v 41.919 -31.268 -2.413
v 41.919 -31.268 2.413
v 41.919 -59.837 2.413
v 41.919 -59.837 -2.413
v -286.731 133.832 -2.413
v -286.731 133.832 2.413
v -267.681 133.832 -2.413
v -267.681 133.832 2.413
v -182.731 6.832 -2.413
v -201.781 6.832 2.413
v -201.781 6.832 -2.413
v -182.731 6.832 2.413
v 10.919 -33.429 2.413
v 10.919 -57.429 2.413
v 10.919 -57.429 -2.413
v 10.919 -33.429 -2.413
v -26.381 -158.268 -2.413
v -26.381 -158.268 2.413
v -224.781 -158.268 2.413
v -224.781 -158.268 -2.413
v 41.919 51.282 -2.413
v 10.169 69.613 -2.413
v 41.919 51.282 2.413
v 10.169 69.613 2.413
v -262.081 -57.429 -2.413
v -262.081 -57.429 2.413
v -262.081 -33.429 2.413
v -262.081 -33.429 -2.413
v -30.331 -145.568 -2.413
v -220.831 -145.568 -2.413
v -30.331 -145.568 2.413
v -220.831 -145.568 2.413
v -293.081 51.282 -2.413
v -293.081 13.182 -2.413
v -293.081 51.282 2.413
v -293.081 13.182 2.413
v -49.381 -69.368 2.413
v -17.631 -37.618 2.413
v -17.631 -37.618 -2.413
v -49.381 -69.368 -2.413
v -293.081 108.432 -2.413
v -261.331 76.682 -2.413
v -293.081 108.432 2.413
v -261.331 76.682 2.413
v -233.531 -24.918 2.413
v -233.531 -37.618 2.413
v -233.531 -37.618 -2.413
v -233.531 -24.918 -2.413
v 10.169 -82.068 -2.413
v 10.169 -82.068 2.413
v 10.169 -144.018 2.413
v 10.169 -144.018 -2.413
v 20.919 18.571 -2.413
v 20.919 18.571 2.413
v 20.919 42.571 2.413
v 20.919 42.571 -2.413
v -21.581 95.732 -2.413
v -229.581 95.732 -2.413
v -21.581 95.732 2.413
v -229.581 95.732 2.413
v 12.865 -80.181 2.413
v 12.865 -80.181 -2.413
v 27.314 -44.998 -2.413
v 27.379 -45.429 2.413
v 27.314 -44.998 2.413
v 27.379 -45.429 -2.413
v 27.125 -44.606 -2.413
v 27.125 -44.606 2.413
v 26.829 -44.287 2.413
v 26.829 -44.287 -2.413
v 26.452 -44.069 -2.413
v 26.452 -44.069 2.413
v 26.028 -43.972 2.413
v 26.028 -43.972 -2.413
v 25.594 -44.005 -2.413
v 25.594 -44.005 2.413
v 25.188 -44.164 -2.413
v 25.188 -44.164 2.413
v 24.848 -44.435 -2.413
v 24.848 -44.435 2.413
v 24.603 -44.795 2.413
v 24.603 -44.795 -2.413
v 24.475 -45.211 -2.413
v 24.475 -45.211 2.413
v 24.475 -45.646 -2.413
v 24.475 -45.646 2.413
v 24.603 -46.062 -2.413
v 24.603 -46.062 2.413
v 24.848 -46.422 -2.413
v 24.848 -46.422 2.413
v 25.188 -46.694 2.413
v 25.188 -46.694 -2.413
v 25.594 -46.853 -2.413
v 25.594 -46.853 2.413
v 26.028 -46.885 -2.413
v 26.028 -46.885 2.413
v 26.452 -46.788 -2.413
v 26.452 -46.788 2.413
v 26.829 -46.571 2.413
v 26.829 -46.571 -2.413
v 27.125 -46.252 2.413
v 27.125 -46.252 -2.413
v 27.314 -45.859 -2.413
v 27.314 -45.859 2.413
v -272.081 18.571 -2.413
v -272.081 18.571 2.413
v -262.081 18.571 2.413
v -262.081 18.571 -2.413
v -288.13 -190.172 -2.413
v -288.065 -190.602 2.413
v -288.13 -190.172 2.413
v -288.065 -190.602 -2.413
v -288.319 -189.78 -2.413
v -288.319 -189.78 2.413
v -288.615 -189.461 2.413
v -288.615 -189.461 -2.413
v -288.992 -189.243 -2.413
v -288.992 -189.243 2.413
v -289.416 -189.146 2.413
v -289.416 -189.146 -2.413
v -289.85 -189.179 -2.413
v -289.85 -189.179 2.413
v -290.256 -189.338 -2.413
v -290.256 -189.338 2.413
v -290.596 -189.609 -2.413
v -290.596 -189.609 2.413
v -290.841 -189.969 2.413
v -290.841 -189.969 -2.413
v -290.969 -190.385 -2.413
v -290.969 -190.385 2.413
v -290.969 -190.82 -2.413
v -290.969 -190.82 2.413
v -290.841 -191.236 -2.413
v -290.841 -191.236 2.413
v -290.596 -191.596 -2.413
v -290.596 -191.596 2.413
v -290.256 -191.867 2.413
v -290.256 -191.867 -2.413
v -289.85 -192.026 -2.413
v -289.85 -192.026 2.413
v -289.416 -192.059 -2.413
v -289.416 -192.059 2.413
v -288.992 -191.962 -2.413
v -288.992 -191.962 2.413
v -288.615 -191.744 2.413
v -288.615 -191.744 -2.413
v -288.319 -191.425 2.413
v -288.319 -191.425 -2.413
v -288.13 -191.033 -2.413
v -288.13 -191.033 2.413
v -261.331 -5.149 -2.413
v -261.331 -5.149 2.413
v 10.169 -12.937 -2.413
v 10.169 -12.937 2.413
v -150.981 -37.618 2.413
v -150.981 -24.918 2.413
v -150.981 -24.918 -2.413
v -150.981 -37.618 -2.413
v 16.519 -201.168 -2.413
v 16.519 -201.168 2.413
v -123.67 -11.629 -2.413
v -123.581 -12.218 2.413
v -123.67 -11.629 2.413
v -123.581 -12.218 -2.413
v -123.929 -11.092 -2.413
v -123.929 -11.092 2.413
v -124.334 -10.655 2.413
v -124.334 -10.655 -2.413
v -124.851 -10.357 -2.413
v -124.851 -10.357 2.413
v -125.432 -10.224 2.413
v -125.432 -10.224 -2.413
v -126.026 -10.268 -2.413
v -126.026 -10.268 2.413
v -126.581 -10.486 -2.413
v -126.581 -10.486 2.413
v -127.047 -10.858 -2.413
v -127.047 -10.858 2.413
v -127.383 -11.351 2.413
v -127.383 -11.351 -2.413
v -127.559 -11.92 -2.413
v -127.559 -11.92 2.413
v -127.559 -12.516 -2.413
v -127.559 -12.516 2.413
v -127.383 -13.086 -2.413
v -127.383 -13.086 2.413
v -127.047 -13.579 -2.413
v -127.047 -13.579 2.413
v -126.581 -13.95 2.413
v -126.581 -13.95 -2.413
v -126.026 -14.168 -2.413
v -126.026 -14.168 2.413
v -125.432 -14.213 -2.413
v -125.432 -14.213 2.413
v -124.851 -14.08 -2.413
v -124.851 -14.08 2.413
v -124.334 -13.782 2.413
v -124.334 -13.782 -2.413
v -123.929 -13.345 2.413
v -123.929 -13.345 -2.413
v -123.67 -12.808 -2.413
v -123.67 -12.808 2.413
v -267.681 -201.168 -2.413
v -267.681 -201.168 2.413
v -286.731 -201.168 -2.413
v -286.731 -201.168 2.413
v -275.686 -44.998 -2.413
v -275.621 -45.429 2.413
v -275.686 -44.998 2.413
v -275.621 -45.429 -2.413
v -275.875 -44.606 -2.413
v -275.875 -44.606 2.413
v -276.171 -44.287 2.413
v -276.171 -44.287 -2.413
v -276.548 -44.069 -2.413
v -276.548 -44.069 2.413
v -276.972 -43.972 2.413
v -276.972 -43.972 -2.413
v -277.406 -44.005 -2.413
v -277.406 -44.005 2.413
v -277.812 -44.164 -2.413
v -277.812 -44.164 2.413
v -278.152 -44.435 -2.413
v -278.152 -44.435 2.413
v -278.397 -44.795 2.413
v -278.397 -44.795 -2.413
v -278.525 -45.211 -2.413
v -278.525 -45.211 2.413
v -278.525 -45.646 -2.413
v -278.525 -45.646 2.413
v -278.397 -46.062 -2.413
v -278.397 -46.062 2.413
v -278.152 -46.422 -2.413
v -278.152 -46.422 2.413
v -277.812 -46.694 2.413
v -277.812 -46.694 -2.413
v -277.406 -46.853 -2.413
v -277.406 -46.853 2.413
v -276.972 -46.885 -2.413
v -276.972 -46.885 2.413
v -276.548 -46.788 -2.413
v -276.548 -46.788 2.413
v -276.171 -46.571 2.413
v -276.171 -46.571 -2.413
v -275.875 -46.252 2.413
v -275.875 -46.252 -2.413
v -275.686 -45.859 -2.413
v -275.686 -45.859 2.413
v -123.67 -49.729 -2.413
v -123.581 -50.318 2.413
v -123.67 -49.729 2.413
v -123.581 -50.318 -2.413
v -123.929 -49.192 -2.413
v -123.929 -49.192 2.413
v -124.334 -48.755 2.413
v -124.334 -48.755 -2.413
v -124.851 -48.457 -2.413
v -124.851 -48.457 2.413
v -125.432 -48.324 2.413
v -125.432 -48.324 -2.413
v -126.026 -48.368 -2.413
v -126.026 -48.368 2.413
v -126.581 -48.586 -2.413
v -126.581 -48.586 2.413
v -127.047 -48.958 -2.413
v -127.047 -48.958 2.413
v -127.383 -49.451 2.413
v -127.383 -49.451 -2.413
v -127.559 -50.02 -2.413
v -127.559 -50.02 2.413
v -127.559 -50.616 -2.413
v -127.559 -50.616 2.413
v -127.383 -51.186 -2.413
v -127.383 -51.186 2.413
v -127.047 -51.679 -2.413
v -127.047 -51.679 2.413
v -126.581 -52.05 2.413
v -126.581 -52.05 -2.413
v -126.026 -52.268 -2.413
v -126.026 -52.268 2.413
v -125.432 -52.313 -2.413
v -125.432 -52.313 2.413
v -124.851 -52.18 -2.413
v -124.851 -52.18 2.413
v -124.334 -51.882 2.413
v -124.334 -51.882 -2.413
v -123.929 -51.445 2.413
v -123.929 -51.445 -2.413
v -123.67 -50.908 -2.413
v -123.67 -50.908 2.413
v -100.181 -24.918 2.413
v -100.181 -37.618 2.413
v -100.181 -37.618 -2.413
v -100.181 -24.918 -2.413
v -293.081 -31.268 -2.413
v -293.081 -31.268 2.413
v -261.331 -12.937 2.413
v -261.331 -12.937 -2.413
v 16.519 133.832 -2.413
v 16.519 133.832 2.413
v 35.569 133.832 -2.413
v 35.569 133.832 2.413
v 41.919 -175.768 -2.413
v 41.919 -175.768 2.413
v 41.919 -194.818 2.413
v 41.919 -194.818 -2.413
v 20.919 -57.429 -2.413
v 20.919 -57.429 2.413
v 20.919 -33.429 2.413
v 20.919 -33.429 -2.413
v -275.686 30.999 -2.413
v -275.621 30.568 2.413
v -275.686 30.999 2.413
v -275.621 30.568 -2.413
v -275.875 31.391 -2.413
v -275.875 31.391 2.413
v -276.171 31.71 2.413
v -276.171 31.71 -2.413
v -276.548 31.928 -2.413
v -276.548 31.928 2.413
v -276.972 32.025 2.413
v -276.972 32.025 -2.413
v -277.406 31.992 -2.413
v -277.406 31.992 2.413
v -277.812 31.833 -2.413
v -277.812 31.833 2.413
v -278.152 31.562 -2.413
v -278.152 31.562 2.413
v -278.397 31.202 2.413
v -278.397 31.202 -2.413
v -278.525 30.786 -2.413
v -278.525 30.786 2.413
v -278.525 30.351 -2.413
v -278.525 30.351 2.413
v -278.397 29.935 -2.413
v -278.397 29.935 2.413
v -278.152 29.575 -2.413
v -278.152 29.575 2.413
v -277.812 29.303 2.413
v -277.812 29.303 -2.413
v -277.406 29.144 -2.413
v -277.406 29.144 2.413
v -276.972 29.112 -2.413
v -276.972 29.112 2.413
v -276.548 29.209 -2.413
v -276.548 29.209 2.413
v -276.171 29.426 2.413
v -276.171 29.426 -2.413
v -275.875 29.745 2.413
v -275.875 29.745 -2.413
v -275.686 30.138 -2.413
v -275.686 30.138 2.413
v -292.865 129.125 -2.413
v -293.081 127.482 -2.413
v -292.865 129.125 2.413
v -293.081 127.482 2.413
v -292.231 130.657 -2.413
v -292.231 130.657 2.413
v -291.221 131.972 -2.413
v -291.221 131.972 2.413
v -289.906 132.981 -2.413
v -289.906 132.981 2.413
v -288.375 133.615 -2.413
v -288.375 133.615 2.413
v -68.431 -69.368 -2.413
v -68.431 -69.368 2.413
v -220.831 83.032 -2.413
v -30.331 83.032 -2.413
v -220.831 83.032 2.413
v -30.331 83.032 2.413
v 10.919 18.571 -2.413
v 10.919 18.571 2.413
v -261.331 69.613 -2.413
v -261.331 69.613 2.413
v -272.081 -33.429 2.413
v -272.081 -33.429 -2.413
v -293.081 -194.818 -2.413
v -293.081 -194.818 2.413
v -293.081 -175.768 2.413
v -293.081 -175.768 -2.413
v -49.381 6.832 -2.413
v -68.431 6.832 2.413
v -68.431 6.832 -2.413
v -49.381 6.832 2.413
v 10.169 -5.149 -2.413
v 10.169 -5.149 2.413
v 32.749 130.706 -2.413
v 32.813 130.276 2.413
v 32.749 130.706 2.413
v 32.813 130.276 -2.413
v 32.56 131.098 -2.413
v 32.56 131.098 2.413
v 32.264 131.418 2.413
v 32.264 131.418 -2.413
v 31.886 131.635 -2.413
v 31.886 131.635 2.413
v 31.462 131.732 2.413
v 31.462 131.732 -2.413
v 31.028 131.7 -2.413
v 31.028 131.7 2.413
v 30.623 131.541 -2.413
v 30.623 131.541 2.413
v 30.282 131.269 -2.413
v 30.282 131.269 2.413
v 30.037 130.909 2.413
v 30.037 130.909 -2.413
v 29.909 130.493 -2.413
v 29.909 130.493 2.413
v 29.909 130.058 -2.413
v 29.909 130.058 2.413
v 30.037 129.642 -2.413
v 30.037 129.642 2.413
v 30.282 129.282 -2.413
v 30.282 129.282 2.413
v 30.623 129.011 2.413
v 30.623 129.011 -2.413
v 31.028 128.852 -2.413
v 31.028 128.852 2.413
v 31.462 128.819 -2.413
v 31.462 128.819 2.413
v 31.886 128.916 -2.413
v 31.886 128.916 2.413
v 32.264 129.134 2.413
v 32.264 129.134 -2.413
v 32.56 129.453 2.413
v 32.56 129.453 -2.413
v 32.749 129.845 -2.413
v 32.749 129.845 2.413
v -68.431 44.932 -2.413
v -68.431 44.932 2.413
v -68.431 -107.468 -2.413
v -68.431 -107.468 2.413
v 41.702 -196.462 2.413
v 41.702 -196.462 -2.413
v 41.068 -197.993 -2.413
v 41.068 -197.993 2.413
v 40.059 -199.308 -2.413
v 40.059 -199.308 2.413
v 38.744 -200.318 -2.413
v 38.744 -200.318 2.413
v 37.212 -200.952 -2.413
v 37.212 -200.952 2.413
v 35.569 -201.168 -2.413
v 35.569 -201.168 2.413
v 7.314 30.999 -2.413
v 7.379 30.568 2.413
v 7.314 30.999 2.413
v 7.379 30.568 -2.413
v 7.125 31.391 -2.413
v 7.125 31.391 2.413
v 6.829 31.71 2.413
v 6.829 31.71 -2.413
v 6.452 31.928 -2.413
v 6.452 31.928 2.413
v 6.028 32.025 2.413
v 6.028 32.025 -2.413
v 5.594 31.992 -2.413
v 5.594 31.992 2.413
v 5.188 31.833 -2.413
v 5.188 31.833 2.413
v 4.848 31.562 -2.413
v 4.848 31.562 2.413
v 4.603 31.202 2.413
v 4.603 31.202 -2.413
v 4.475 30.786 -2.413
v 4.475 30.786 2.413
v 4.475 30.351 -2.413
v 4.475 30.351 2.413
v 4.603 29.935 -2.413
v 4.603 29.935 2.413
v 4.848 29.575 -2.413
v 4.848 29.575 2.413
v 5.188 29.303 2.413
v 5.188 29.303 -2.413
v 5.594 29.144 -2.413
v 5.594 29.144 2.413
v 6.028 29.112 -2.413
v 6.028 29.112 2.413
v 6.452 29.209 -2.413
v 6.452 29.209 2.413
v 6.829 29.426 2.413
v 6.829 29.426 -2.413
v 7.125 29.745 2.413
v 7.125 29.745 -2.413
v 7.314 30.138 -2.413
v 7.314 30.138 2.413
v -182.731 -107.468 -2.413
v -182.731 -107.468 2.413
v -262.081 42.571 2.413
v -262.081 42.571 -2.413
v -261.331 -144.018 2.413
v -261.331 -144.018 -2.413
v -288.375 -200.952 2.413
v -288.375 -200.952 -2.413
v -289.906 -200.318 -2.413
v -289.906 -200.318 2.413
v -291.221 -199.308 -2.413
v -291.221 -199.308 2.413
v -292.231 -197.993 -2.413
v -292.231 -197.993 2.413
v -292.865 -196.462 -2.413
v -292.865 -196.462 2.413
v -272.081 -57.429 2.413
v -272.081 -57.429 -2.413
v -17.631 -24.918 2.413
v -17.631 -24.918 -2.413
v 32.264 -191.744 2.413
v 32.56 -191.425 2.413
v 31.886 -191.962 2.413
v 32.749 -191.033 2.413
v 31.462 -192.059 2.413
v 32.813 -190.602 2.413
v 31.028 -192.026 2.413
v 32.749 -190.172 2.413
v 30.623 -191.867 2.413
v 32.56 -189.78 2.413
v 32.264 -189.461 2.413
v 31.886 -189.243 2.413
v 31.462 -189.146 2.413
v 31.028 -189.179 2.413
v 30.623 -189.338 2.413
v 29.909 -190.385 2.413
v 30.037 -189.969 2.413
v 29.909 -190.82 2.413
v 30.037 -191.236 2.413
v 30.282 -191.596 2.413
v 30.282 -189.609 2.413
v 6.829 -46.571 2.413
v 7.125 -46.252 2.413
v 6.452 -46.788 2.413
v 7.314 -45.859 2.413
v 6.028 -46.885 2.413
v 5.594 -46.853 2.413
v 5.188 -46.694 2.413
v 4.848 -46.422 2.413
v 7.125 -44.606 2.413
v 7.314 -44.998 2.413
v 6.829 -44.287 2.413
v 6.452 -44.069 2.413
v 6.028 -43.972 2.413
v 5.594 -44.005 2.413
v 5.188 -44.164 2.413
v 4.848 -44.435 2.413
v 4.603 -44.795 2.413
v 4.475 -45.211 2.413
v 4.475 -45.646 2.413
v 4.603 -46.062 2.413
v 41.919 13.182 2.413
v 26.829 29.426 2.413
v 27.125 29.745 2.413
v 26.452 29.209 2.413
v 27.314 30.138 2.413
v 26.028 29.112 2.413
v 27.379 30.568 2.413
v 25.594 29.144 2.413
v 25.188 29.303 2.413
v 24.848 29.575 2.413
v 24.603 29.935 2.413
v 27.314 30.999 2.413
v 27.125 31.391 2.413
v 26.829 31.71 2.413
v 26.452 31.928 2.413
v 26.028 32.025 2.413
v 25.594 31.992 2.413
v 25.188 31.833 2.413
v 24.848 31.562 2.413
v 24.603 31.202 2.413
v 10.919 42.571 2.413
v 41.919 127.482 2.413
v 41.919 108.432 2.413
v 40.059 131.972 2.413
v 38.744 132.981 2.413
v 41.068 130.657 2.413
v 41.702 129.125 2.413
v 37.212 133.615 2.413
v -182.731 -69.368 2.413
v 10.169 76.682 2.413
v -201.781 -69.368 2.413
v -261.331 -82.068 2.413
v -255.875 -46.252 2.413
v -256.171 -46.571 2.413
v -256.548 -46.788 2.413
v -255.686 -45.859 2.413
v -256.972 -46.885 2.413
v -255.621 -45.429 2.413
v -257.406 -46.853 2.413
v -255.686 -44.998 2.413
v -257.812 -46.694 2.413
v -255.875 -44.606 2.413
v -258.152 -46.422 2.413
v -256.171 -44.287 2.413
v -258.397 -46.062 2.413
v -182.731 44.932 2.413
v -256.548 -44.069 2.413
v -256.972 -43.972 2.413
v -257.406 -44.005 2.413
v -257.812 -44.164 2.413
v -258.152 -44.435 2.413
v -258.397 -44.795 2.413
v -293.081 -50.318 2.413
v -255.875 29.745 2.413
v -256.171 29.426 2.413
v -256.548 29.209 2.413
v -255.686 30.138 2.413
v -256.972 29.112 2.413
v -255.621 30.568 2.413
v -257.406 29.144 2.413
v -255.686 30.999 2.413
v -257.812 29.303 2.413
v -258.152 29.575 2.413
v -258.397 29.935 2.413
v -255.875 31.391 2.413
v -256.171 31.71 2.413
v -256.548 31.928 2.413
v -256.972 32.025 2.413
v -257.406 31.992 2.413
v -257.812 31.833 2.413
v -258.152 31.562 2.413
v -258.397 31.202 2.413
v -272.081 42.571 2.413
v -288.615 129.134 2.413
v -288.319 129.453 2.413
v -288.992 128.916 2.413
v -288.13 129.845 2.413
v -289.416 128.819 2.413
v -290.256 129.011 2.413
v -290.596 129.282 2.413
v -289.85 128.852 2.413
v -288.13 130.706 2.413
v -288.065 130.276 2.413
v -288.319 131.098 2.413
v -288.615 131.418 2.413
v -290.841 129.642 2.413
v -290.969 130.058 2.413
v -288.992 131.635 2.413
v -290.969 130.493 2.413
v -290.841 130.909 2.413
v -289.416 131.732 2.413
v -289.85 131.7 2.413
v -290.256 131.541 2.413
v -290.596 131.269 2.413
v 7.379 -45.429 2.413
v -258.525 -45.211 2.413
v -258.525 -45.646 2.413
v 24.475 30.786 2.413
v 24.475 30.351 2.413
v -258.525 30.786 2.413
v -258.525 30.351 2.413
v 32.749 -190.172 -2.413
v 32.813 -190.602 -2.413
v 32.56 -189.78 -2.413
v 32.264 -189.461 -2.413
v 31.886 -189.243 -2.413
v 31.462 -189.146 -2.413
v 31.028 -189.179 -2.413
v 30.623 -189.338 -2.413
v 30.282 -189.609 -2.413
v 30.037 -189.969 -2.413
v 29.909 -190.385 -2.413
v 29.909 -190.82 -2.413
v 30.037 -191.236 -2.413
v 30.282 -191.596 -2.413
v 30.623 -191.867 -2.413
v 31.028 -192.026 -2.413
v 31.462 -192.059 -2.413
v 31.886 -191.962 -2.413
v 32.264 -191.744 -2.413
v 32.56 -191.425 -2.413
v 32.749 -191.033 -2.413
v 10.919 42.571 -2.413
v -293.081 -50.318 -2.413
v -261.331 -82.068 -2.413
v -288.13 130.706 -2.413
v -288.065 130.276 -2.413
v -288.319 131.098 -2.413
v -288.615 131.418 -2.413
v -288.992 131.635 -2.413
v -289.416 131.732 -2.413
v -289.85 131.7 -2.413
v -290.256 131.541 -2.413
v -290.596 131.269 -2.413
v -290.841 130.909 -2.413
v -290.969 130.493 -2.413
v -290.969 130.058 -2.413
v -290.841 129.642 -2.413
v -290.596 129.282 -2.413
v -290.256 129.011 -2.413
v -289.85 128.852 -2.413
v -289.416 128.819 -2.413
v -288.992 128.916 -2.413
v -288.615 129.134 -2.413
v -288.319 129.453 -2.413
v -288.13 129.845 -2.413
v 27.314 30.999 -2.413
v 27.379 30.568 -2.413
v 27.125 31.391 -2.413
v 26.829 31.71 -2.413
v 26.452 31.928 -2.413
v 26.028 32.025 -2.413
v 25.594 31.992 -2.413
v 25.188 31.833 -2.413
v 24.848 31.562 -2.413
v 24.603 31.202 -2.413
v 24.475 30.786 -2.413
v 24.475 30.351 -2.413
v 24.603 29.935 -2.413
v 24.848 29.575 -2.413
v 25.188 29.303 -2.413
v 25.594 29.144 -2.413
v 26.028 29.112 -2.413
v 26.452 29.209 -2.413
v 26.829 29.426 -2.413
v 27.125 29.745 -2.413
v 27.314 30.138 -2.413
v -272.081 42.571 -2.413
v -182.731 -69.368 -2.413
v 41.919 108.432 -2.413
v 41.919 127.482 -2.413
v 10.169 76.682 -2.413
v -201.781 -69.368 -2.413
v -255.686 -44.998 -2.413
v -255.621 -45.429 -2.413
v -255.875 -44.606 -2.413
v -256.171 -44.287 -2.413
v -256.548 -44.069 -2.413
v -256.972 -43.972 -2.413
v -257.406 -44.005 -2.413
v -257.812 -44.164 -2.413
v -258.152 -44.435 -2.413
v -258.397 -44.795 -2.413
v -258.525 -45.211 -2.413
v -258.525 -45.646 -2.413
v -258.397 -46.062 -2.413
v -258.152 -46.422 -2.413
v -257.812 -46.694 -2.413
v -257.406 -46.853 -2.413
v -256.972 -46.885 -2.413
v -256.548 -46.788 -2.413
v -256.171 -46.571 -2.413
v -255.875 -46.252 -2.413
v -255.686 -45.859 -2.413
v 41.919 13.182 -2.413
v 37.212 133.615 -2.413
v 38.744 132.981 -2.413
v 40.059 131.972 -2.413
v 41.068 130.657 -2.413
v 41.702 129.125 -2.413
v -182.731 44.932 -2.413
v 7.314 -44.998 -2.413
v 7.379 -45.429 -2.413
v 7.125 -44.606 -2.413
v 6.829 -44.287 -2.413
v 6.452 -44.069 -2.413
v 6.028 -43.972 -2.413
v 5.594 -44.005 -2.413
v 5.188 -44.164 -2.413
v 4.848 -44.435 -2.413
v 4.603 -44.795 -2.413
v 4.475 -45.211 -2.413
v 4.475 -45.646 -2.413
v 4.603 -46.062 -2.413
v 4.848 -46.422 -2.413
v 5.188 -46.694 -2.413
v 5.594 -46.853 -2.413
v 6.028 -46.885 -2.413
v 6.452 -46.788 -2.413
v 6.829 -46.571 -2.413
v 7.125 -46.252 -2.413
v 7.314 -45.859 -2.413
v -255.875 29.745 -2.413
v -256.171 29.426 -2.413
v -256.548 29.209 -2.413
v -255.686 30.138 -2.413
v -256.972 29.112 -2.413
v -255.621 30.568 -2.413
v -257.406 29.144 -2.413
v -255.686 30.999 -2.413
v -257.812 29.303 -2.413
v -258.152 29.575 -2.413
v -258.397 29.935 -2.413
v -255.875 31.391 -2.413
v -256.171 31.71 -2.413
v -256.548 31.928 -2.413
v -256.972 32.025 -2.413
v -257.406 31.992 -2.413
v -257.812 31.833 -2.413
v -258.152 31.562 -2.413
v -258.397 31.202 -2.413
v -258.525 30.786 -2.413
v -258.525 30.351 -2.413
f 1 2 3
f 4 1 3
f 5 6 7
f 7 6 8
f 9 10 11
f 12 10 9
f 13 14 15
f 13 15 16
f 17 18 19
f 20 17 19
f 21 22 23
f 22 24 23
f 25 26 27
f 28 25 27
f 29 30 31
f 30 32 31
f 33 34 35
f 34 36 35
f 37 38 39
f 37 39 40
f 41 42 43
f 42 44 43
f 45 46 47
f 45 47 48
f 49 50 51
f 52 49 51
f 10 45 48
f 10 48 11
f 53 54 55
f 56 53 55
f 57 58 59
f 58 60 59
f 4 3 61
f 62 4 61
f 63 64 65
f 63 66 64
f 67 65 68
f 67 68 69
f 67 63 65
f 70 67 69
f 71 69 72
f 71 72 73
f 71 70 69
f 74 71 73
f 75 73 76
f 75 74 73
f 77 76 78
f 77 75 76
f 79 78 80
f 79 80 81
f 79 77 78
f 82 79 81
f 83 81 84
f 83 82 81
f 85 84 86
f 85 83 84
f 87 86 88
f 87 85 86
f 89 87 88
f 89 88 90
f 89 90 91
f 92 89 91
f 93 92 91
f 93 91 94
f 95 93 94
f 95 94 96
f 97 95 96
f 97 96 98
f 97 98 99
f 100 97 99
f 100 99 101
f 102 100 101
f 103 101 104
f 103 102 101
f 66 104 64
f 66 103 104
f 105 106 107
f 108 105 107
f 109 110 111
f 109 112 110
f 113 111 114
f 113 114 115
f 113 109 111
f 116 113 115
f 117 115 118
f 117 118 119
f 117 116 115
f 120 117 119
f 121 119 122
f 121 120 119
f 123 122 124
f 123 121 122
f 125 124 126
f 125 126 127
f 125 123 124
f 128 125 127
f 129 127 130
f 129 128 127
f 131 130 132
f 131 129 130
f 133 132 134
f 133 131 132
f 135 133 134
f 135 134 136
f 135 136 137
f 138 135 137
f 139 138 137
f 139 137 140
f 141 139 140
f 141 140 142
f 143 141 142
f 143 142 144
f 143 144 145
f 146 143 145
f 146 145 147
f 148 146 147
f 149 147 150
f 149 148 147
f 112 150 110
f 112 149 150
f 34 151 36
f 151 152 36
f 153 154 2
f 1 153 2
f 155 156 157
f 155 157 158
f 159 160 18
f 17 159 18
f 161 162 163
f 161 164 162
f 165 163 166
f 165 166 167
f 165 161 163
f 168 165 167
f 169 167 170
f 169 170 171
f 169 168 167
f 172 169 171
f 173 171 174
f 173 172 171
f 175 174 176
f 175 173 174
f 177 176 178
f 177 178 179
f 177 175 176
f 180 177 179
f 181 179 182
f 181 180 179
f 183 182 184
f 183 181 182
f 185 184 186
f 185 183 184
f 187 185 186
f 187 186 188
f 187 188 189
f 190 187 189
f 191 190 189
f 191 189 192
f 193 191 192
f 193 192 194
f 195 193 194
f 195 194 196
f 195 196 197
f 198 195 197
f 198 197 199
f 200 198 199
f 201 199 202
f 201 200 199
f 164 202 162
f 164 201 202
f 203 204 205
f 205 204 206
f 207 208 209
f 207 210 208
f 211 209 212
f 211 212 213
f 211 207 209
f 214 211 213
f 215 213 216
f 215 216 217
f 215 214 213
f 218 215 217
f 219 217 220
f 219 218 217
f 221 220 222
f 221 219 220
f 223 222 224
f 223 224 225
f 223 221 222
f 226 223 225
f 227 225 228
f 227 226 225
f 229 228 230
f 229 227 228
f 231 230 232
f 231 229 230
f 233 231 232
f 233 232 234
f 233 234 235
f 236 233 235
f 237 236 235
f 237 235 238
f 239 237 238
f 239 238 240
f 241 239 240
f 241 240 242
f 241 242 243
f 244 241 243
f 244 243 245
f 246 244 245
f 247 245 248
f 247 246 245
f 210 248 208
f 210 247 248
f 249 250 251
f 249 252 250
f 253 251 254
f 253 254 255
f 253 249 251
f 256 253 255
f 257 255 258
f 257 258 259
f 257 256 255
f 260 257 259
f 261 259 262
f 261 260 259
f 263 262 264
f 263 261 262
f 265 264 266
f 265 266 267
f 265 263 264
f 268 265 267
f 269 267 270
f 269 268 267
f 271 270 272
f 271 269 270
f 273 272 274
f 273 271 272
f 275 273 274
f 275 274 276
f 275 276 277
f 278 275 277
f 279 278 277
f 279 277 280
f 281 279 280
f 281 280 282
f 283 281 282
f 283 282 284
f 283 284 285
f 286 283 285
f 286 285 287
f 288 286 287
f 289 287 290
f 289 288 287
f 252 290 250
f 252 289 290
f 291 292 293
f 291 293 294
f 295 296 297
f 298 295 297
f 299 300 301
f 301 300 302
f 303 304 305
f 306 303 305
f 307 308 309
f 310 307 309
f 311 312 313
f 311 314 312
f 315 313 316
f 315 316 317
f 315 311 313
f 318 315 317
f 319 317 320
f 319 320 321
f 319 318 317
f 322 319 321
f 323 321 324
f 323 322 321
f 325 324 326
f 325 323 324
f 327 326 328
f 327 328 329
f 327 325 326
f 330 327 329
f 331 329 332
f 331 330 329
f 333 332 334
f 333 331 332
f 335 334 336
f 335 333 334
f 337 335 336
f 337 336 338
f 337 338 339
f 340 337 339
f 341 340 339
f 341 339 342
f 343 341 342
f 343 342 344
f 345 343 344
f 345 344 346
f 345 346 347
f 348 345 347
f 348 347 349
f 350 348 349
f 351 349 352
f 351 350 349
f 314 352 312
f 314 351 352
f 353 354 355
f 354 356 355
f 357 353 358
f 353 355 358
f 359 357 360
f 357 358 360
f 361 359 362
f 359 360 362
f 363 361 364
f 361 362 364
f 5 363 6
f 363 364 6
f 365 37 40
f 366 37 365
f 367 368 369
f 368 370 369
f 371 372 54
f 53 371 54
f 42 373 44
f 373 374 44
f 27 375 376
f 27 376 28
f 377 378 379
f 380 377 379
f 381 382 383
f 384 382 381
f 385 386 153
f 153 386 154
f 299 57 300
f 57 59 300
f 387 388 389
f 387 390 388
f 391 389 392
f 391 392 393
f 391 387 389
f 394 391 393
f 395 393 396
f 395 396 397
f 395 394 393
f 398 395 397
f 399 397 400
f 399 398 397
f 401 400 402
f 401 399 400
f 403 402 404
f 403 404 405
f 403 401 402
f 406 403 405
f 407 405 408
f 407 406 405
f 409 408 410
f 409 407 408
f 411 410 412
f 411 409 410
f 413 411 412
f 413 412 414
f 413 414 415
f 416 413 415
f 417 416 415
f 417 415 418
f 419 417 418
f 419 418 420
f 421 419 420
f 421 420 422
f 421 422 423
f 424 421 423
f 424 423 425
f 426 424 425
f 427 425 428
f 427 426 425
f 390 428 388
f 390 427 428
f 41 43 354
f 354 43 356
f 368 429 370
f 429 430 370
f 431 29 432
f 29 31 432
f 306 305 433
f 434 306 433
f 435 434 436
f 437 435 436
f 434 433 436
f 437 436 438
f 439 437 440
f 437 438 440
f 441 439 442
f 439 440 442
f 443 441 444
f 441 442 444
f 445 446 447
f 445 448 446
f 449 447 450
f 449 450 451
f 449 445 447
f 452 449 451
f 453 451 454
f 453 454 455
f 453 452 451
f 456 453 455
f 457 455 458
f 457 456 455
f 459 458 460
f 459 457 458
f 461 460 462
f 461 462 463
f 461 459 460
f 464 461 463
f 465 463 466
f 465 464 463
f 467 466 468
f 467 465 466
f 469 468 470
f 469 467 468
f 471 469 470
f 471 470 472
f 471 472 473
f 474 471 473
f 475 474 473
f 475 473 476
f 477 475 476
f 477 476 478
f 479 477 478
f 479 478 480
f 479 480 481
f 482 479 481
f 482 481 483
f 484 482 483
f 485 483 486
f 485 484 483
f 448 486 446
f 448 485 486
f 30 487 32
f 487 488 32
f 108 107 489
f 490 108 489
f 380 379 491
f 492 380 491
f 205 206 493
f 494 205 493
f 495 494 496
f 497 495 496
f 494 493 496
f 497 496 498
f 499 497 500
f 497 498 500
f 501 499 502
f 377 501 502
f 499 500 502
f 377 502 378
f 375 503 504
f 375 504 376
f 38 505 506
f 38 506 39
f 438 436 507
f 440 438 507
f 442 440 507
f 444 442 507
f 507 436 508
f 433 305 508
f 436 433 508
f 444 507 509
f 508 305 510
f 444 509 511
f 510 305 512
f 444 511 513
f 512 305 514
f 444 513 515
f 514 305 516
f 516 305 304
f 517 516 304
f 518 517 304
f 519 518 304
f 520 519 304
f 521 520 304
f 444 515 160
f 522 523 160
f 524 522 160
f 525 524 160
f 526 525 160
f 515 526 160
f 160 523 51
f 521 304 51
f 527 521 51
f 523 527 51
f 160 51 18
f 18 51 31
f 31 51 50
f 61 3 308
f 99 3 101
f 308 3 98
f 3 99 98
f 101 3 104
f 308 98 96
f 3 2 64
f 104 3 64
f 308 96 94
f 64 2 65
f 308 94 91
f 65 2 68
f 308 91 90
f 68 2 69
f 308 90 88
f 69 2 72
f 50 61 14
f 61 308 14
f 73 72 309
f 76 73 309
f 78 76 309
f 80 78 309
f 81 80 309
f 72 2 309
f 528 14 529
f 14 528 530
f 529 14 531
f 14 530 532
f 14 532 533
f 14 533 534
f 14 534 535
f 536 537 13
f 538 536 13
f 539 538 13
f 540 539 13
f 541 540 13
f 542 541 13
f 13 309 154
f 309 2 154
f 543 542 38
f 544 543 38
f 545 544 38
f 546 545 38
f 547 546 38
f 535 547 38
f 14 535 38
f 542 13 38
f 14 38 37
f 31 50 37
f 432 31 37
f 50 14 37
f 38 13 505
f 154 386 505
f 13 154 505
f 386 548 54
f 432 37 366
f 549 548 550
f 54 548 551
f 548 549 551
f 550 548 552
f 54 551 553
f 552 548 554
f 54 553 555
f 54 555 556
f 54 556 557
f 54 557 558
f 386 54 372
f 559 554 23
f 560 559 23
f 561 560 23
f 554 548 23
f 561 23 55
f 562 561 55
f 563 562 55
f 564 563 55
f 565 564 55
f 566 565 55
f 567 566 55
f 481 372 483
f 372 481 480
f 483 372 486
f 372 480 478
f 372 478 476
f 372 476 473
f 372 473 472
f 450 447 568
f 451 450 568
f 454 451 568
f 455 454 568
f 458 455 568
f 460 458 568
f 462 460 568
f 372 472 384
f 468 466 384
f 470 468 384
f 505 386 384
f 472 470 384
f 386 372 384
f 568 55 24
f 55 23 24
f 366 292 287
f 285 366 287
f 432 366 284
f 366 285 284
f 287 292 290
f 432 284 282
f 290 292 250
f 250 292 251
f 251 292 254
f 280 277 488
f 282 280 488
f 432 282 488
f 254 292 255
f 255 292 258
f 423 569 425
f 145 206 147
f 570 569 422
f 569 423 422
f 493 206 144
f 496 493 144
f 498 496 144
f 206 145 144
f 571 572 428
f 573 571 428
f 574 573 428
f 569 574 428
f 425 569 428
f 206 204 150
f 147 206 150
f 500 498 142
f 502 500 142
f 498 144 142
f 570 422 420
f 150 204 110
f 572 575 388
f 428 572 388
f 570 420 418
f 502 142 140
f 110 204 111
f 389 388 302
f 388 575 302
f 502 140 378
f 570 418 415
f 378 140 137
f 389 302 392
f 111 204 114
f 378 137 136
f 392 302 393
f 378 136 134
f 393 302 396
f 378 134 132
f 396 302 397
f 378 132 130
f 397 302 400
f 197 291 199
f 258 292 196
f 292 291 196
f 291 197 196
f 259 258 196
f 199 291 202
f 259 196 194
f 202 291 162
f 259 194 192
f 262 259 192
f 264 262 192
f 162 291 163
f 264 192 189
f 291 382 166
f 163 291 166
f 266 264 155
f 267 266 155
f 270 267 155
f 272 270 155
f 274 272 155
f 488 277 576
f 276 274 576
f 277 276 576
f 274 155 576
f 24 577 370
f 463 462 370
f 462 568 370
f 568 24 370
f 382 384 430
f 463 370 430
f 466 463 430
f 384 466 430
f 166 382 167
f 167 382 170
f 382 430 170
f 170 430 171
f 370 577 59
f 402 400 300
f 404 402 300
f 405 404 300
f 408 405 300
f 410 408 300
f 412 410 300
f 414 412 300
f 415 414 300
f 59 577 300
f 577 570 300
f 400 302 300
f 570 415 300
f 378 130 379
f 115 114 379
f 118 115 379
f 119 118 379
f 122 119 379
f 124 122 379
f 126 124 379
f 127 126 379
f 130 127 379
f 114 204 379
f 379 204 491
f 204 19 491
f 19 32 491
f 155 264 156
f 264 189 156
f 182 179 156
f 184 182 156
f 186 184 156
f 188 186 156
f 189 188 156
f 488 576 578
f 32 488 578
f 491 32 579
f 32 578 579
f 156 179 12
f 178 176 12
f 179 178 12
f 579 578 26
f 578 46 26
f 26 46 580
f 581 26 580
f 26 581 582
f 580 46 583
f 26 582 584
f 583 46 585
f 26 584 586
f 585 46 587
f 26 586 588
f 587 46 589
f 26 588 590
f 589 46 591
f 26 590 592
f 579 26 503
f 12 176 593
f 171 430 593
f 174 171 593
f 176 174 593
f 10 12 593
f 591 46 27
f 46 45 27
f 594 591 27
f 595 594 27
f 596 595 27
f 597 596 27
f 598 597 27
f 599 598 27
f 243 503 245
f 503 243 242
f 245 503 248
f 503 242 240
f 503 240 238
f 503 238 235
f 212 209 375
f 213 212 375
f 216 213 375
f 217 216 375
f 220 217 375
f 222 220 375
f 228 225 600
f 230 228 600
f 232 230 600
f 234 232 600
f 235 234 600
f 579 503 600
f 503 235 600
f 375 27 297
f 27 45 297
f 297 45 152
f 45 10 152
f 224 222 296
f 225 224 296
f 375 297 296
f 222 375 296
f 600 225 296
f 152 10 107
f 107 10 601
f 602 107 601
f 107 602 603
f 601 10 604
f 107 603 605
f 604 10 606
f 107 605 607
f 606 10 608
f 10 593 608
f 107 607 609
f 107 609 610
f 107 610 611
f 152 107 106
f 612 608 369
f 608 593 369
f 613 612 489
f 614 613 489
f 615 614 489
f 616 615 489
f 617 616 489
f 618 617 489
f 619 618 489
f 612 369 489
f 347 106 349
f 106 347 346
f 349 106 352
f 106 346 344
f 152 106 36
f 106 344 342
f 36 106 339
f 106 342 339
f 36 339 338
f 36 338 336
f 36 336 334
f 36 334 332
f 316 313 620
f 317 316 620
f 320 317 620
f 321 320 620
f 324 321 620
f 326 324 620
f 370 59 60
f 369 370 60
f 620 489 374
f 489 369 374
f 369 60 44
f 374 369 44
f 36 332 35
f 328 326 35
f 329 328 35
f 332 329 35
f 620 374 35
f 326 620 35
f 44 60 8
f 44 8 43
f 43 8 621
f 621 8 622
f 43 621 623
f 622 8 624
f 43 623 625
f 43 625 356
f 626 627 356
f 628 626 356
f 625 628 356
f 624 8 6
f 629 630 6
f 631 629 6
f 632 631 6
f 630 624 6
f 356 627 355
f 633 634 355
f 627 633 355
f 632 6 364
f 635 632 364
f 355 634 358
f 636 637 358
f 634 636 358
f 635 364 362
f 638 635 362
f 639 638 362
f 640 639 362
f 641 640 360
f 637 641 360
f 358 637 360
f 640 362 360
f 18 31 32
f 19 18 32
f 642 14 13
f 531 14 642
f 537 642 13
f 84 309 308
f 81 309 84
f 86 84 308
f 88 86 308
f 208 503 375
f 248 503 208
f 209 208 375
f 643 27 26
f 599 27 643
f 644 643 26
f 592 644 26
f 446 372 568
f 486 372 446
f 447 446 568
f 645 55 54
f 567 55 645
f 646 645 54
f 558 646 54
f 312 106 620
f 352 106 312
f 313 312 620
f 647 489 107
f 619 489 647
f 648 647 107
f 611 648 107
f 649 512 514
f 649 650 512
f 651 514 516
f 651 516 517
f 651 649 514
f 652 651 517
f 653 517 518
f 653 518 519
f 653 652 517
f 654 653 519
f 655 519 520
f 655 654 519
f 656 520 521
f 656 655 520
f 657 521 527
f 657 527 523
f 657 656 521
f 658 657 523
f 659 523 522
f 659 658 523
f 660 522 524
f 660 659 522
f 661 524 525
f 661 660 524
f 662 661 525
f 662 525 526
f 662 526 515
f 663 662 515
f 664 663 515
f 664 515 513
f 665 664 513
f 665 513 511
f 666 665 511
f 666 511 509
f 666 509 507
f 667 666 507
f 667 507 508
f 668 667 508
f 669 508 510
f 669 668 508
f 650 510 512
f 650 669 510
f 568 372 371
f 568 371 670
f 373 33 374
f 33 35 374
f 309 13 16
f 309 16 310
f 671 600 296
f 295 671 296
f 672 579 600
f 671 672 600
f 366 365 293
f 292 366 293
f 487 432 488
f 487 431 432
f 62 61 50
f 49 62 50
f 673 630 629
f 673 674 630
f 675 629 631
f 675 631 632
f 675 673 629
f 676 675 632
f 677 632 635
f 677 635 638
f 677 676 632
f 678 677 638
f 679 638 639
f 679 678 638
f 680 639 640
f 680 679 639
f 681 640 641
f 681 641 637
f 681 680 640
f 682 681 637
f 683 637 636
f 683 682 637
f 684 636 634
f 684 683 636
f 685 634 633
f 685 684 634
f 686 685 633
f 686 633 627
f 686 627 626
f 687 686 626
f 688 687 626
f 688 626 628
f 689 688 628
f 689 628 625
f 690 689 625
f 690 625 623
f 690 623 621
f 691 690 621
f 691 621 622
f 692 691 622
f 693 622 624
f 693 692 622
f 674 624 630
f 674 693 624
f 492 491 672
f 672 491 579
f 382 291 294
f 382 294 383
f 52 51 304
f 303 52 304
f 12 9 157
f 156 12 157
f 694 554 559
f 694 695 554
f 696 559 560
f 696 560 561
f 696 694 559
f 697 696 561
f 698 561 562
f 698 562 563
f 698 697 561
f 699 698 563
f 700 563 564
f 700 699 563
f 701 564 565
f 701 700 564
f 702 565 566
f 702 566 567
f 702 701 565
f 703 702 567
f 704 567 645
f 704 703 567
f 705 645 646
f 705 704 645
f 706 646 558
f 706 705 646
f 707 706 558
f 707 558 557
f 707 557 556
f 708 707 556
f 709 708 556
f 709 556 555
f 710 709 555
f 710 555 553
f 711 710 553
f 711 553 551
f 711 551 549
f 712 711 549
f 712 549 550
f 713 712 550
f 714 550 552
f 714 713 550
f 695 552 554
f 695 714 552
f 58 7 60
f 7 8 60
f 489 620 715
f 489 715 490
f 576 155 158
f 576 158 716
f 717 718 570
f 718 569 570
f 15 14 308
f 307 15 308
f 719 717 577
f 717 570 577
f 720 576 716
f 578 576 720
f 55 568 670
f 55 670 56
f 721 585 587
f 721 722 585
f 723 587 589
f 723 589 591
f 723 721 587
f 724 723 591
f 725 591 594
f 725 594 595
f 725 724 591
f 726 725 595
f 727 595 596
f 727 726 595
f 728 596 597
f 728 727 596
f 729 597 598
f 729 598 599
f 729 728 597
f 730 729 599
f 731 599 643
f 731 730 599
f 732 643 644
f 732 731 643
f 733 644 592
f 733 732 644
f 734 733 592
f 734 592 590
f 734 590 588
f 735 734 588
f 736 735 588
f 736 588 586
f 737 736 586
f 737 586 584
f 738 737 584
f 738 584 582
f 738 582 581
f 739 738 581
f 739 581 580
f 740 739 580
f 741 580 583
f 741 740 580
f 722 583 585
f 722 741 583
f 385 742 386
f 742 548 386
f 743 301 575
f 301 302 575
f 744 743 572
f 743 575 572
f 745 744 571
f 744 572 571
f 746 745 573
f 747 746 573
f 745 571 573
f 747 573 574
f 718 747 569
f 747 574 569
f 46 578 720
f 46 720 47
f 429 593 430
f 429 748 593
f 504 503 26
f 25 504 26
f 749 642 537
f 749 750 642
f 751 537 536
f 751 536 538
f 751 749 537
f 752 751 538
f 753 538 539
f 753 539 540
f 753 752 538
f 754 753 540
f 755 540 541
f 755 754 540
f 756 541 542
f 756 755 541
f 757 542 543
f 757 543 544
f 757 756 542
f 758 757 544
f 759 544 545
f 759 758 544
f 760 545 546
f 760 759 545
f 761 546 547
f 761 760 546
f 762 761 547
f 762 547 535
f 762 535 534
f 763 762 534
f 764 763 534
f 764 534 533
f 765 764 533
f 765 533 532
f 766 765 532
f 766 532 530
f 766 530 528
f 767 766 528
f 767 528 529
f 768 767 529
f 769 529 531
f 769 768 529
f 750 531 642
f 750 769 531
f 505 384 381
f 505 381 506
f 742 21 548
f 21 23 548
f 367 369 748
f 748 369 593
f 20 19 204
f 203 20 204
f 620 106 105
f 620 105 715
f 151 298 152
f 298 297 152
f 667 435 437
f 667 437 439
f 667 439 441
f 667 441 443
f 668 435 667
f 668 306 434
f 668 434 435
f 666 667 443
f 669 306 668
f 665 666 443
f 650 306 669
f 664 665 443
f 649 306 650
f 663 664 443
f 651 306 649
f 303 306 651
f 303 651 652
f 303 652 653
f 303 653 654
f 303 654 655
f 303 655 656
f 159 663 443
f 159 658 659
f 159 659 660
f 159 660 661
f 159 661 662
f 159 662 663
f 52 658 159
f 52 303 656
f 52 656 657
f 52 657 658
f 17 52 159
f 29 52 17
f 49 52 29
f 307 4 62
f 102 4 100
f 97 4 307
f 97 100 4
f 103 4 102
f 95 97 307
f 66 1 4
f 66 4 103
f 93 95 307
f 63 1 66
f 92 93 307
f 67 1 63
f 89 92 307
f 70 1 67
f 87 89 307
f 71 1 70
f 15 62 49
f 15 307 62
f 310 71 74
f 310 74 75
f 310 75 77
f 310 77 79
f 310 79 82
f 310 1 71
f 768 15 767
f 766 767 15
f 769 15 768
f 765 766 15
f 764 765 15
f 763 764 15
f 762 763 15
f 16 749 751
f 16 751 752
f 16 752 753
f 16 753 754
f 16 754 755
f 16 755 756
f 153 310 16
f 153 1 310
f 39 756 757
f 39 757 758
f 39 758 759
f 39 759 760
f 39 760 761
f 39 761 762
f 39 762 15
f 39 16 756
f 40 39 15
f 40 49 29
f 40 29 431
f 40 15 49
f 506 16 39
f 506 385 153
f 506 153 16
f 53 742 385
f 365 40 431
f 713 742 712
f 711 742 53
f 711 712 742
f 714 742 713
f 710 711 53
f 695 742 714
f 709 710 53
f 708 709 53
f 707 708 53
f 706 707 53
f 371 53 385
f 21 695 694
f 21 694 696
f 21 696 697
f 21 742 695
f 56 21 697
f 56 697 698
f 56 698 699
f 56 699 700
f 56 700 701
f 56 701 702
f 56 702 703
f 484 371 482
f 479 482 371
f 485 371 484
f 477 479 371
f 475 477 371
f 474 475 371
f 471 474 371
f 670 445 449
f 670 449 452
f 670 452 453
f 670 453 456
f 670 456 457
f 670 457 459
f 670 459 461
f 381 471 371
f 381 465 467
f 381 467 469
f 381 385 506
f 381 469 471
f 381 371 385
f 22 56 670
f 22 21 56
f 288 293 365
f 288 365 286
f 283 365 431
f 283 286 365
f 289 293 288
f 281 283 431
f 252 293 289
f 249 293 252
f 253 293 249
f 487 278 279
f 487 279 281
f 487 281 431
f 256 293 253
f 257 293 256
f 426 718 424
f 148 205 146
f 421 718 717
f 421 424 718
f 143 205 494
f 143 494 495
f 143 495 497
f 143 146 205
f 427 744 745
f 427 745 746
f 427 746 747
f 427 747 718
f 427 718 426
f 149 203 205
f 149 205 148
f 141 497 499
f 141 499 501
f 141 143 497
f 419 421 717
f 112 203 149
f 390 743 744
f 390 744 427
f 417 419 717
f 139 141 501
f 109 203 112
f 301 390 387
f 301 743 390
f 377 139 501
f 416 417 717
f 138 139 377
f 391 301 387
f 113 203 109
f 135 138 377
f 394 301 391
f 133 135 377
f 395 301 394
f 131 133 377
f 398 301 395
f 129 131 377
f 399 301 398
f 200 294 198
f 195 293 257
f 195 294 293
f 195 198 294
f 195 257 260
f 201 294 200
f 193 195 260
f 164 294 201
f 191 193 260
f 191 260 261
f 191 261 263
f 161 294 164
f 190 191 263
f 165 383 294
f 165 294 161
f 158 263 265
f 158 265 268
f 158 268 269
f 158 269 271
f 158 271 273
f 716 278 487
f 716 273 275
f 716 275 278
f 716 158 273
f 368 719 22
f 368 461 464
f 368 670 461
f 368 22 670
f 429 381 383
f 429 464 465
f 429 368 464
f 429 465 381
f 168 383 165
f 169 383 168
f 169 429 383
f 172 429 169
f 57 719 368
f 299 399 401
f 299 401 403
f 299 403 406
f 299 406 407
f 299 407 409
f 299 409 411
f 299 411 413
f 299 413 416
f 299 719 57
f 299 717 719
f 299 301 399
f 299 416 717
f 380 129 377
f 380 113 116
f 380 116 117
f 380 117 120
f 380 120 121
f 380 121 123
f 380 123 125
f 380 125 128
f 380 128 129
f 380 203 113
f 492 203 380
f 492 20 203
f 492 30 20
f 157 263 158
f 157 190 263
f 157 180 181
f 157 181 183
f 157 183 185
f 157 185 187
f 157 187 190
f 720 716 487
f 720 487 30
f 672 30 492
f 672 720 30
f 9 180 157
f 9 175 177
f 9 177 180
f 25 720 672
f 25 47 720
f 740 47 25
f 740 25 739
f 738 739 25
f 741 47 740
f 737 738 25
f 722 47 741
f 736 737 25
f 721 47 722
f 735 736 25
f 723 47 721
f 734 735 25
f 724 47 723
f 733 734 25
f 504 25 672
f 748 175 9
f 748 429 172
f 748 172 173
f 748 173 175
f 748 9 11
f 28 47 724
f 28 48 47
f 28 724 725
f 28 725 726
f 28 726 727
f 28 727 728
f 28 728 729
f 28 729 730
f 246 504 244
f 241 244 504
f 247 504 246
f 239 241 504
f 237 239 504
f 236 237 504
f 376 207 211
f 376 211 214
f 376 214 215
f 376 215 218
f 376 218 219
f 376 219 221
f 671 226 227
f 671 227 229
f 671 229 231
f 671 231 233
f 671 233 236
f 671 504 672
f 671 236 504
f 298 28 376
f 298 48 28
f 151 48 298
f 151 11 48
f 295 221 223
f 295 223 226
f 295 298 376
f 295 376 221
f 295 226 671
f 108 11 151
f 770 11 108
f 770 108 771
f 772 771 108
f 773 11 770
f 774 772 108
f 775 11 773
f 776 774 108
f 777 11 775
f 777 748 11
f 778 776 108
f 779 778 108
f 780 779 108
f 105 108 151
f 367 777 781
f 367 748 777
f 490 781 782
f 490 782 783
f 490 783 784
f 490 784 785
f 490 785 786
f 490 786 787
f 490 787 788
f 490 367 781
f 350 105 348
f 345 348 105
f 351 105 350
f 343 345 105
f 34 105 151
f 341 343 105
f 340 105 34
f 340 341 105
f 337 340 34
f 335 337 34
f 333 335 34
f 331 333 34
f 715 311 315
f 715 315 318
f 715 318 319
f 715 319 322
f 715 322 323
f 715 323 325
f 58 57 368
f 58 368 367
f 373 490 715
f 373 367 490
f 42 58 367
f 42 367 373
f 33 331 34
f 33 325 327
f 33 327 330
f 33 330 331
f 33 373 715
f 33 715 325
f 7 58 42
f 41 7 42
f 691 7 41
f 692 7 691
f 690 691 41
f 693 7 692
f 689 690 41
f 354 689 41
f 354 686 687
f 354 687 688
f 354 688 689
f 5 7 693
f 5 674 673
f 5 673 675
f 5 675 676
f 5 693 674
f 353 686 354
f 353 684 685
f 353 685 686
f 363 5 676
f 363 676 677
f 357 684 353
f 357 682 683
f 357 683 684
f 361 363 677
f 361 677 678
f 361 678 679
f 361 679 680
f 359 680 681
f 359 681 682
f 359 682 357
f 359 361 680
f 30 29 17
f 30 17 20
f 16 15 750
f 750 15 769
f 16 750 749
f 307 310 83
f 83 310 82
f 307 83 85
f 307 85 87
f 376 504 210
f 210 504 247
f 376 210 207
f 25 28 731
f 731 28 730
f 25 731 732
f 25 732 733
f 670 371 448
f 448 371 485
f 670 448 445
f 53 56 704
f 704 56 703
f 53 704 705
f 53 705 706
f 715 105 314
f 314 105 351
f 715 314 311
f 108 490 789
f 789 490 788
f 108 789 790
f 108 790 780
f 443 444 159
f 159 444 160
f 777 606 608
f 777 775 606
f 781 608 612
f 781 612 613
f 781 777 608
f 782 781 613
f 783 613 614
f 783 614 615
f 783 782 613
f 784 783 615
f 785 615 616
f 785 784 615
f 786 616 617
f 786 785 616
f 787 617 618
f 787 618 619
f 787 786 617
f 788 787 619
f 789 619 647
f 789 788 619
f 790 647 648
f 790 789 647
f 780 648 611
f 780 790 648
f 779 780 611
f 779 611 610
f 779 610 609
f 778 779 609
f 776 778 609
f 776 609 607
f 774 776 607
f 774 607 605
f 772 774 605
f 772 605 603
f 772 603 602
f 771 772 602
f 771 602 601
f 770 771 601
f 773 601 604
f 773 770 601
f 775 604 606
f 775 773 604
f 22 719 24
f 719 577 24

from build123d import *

# Parameters (mm, degrees)
MODEL_R             = 1.4605
MODEL_R_2           = 2
BOSS_EXTRUDE1_DEPTH = 2.413
SKETCH1_W           = 10
SKETCH1_H           = 24
CUT_EXTRUDE1_DEPTH  = 10


with BuildPart() as part:
    # Model → Boss-Extrude1 (new body, symmetric)
    with BuildSketch(Plane.XY):
        with BuildLine():
            Line((-293.081304326, -31.2683), (-261.331304326, -12.937428953))
            Line((-261.331304326, -12.937428953), (-261.331304326, -5.149171047))
            Line((-261.331304326, -5.149171047), (-293.081304326, 13.1817))
            Line((-293.081304326, 13.1817), (-293.081304326, 51.2817))
            Line((-293.081304326, 51.2817), (-261.331304326, 69.612571047))
            Line((-261.331304326, 69.612571047), (-261.331304326, 76.6817))
            Line((-261.331304326, 76.6817), (-293.081304326, 108.4317))
            Line((-293.081304326, 108.4317), (-293.081304326, 127.4817))
            ThreePointArc((-293.081304326, 127.4817), (-291.221432386, 131.971828061), (-286.731304326, 133.8317))
            Line((-286.731304326, 133.8317), (-267.681304326, 133.8317))
            Line((-267.681304326, 133.8317), (-229.581304326, 95.7317))
            Line((-229.581304326, 95.7317), (-21.581304326, 95.7317))
            Line((-21.581304326, 95.7317), (16.518695674, 133.8317))
            Line((16.518695674, 133.8317), (35.568695674, 133.8317))
            ThreePointArc((35.568695674, 133.8317), (40.058823735, 131.971828061), (41.918695674, 127.4817))
            Line((41.918695674, 127.4817), (41.918695674, 108.4317))
            Line((41.918695674, 108.4317), (10.168695674, 76.6817))
            Line((10.168695674, 76.6817), (10.168695674, 69.612571047))
            Line((10.168695674, 69.612571047), (41.918695674, 51.2817))
            Line((41.918695674, 51.2817), (41.918695674, 13.1817))
            Line((41.918695674, 13.1817), (10.168695674, -5.149171047))
            Line((10.168695674, -5.149171047), (10.168695674, -12.937428953))
            Line((10.168695674, -12.937428953), (41.918695674, -31.2683))
            Line((41.918695674, -31.2683), (41.918695674, -59.836710662))
            Line((41.918695674, -59.836710662), (12.864640386, -80.18057919))
            Line((12.864640386, -80.18057919), (10.168695674, -82.0683))
            Line((10.168695674, -82.0683), (10.168695674, -144.0183))
            Line((10.168695674, -144.0183), (41.918695674, -175.7683))
            Line((41.918695674, -175.7683), (41.918695674, -194.8183))
            ThreePointArc((41.918695674, -194.8183), (40.058823735, -199.308428061), (35.568695674, -201.1683))
            Line((35.568695674, -201.1683), (16.518695674, -201.1683))
            Line((16.518695674, -201.1683), (-26.381304326, -158.2683))
            Line((-26.381304326, -158.2683), (-224.781304326, -158.2683))
            Line((-224.781304326, -158.2683), (-267.681304326, -201.1683))
            Line((-267.681304326, -201.1683), (-286.731304326, -201.1683))
            ThreePointArc((-286.731304326, -201.1683), (-291.221432386, -199.308428061), (-293.081304326, -194.8183))
            Line((-293.081304326, -194.8183), (-293.081304326, -175.7683))
            Line((-293.081304326, -175.7683), (-261.331304326, -144.0183))
            Line((-261.331304326, -144.0183), (-261.331304326, -82.0683))
            Line((-261.331304326, -82.0683), (-293.081304326, -50.3183))
            Line((-293.081304326, -50.3183), (-293.081304326, -31.2683))
        make_face()
        with Locations((-289.525304326, -190.6025)):
            Circle(MODEL_R, mode=Mode.SUBTRACT)
        with Locations((31.352895674, -190.6025)):
            Circle(MODEL_R, mode=Mode.SUBTRACT)
        with Locations((31.352895674, 130.2757)):
            Circle(MODEL_R, mode=Mode.SUBTRACT)
        with Locations((-289.525304326, 130.2757)):
            Circle(MODEL_R, mode=Mode.SUBTRACT)
        with Locations((-277.081304256, -45.4288)):
            Circle(MODEL_R, mode=Mode.SUBTRACT)
        with Locations((-257.081304256, -45.4288)):
            Circle(MODEL_R, mode=Mode.SUBTRACT)
        with Locations((25.918695604, -45.4288)):
            Circle(MODEL_R, mode=Mode.SUBTRACT)
        with Locations((5.918695604, -45.4288)):
            Circle(MODEL_R, mode=Mode.SUBTRACT)
        with Locations((25.918695604, 30.5682)):
            Circle(MODEL_R, mode=Mode.SUBTRACT)
        with Locations((5.918695604, 30.5682)):
            Circle(MODEL_R, mode=Mode.SUBTRACT)
        with Locations((-257.081304256, 30.5682)):
            Circle(MODEL_R, mode=Mode.SUBTRACT)
        with Locations((-277.081304256, 30.5682)):
            Circle(MODEL_R, mode=Mode.SUBTRACT)
        with Locations((-125.581304326, -12.2183)):
            Circle(MODEL_R_2, mode=Mode.SUBTRACT)
        with Locations((-125.581304326, -50.3183)):
            Circle(MODEL_R_2, mode=Mode.SUBTRACT)
        Polygon((-30.331304326, -145.5683), (-68.431304326, -107.4683), (-182.731304326, -107.4683), (-220.831304326, -145.5683), align=None, mode=Mode.SUBTRACT)
        Polygon((-220.831304326, 83.0317), (-182.731304326, 44.9317), (-68.431304326, 44.9317), (-30.331304326, 83.0317), align=None, mode=Mode.SUBTRACT)
        Polygon((-201.781304326, -69.3683), (-233.531304326, -37.6183), (-233.531304326, -24.9183), (-201.781304326, 6.8317), (-182.731304326, 6.8317), (-150.981304326, -24.9183), (-150.981304326, -37.6183), (-182.731304326, -69.3683), align=None, mode=Mode.SUBTRACT)
        Polygon((-100.181304326, -37.6183), (-100.181304326, -24.9183), (-68.431304326, 6.8317), (-49.381304326, 6.8317), (-17.631304326, -24.9183), (-17.631304326, -37.6183), (-49.381304326, -69.3683), (-68.431304326, -69.3683), align=None, mode=Mode.SUBTRACT)
    extrude(amount=BOSS_EXTRUDE1_DEPTH, both=True)

    # Sketch1 → Cut-Extrude1 (cut)
    with BuildSketch(Plane.XY.offset(2.413)):
        with Locations((-267.081304256, -45.4288)):
            Rectangle(SKETCH1_W, SKETCH1_H)
        with Locations((-267.081304256, 30.5712)):
            Rectangle(SKETCH1_W, SKETCH1_H)
        with Locations((15.918695604, 30.5712)):
            Rectangle(SKETCH1_W, SKETCH1_H)
        with Locations((15.918695604, -45.4288)):
            Rectangle(SKETCH1_W, SKETCH1_H)
    extrude(amount=-CUT_EXTRUDE1_DEPTH, mode=Mode.SUBTRACT)


solid = part.part
